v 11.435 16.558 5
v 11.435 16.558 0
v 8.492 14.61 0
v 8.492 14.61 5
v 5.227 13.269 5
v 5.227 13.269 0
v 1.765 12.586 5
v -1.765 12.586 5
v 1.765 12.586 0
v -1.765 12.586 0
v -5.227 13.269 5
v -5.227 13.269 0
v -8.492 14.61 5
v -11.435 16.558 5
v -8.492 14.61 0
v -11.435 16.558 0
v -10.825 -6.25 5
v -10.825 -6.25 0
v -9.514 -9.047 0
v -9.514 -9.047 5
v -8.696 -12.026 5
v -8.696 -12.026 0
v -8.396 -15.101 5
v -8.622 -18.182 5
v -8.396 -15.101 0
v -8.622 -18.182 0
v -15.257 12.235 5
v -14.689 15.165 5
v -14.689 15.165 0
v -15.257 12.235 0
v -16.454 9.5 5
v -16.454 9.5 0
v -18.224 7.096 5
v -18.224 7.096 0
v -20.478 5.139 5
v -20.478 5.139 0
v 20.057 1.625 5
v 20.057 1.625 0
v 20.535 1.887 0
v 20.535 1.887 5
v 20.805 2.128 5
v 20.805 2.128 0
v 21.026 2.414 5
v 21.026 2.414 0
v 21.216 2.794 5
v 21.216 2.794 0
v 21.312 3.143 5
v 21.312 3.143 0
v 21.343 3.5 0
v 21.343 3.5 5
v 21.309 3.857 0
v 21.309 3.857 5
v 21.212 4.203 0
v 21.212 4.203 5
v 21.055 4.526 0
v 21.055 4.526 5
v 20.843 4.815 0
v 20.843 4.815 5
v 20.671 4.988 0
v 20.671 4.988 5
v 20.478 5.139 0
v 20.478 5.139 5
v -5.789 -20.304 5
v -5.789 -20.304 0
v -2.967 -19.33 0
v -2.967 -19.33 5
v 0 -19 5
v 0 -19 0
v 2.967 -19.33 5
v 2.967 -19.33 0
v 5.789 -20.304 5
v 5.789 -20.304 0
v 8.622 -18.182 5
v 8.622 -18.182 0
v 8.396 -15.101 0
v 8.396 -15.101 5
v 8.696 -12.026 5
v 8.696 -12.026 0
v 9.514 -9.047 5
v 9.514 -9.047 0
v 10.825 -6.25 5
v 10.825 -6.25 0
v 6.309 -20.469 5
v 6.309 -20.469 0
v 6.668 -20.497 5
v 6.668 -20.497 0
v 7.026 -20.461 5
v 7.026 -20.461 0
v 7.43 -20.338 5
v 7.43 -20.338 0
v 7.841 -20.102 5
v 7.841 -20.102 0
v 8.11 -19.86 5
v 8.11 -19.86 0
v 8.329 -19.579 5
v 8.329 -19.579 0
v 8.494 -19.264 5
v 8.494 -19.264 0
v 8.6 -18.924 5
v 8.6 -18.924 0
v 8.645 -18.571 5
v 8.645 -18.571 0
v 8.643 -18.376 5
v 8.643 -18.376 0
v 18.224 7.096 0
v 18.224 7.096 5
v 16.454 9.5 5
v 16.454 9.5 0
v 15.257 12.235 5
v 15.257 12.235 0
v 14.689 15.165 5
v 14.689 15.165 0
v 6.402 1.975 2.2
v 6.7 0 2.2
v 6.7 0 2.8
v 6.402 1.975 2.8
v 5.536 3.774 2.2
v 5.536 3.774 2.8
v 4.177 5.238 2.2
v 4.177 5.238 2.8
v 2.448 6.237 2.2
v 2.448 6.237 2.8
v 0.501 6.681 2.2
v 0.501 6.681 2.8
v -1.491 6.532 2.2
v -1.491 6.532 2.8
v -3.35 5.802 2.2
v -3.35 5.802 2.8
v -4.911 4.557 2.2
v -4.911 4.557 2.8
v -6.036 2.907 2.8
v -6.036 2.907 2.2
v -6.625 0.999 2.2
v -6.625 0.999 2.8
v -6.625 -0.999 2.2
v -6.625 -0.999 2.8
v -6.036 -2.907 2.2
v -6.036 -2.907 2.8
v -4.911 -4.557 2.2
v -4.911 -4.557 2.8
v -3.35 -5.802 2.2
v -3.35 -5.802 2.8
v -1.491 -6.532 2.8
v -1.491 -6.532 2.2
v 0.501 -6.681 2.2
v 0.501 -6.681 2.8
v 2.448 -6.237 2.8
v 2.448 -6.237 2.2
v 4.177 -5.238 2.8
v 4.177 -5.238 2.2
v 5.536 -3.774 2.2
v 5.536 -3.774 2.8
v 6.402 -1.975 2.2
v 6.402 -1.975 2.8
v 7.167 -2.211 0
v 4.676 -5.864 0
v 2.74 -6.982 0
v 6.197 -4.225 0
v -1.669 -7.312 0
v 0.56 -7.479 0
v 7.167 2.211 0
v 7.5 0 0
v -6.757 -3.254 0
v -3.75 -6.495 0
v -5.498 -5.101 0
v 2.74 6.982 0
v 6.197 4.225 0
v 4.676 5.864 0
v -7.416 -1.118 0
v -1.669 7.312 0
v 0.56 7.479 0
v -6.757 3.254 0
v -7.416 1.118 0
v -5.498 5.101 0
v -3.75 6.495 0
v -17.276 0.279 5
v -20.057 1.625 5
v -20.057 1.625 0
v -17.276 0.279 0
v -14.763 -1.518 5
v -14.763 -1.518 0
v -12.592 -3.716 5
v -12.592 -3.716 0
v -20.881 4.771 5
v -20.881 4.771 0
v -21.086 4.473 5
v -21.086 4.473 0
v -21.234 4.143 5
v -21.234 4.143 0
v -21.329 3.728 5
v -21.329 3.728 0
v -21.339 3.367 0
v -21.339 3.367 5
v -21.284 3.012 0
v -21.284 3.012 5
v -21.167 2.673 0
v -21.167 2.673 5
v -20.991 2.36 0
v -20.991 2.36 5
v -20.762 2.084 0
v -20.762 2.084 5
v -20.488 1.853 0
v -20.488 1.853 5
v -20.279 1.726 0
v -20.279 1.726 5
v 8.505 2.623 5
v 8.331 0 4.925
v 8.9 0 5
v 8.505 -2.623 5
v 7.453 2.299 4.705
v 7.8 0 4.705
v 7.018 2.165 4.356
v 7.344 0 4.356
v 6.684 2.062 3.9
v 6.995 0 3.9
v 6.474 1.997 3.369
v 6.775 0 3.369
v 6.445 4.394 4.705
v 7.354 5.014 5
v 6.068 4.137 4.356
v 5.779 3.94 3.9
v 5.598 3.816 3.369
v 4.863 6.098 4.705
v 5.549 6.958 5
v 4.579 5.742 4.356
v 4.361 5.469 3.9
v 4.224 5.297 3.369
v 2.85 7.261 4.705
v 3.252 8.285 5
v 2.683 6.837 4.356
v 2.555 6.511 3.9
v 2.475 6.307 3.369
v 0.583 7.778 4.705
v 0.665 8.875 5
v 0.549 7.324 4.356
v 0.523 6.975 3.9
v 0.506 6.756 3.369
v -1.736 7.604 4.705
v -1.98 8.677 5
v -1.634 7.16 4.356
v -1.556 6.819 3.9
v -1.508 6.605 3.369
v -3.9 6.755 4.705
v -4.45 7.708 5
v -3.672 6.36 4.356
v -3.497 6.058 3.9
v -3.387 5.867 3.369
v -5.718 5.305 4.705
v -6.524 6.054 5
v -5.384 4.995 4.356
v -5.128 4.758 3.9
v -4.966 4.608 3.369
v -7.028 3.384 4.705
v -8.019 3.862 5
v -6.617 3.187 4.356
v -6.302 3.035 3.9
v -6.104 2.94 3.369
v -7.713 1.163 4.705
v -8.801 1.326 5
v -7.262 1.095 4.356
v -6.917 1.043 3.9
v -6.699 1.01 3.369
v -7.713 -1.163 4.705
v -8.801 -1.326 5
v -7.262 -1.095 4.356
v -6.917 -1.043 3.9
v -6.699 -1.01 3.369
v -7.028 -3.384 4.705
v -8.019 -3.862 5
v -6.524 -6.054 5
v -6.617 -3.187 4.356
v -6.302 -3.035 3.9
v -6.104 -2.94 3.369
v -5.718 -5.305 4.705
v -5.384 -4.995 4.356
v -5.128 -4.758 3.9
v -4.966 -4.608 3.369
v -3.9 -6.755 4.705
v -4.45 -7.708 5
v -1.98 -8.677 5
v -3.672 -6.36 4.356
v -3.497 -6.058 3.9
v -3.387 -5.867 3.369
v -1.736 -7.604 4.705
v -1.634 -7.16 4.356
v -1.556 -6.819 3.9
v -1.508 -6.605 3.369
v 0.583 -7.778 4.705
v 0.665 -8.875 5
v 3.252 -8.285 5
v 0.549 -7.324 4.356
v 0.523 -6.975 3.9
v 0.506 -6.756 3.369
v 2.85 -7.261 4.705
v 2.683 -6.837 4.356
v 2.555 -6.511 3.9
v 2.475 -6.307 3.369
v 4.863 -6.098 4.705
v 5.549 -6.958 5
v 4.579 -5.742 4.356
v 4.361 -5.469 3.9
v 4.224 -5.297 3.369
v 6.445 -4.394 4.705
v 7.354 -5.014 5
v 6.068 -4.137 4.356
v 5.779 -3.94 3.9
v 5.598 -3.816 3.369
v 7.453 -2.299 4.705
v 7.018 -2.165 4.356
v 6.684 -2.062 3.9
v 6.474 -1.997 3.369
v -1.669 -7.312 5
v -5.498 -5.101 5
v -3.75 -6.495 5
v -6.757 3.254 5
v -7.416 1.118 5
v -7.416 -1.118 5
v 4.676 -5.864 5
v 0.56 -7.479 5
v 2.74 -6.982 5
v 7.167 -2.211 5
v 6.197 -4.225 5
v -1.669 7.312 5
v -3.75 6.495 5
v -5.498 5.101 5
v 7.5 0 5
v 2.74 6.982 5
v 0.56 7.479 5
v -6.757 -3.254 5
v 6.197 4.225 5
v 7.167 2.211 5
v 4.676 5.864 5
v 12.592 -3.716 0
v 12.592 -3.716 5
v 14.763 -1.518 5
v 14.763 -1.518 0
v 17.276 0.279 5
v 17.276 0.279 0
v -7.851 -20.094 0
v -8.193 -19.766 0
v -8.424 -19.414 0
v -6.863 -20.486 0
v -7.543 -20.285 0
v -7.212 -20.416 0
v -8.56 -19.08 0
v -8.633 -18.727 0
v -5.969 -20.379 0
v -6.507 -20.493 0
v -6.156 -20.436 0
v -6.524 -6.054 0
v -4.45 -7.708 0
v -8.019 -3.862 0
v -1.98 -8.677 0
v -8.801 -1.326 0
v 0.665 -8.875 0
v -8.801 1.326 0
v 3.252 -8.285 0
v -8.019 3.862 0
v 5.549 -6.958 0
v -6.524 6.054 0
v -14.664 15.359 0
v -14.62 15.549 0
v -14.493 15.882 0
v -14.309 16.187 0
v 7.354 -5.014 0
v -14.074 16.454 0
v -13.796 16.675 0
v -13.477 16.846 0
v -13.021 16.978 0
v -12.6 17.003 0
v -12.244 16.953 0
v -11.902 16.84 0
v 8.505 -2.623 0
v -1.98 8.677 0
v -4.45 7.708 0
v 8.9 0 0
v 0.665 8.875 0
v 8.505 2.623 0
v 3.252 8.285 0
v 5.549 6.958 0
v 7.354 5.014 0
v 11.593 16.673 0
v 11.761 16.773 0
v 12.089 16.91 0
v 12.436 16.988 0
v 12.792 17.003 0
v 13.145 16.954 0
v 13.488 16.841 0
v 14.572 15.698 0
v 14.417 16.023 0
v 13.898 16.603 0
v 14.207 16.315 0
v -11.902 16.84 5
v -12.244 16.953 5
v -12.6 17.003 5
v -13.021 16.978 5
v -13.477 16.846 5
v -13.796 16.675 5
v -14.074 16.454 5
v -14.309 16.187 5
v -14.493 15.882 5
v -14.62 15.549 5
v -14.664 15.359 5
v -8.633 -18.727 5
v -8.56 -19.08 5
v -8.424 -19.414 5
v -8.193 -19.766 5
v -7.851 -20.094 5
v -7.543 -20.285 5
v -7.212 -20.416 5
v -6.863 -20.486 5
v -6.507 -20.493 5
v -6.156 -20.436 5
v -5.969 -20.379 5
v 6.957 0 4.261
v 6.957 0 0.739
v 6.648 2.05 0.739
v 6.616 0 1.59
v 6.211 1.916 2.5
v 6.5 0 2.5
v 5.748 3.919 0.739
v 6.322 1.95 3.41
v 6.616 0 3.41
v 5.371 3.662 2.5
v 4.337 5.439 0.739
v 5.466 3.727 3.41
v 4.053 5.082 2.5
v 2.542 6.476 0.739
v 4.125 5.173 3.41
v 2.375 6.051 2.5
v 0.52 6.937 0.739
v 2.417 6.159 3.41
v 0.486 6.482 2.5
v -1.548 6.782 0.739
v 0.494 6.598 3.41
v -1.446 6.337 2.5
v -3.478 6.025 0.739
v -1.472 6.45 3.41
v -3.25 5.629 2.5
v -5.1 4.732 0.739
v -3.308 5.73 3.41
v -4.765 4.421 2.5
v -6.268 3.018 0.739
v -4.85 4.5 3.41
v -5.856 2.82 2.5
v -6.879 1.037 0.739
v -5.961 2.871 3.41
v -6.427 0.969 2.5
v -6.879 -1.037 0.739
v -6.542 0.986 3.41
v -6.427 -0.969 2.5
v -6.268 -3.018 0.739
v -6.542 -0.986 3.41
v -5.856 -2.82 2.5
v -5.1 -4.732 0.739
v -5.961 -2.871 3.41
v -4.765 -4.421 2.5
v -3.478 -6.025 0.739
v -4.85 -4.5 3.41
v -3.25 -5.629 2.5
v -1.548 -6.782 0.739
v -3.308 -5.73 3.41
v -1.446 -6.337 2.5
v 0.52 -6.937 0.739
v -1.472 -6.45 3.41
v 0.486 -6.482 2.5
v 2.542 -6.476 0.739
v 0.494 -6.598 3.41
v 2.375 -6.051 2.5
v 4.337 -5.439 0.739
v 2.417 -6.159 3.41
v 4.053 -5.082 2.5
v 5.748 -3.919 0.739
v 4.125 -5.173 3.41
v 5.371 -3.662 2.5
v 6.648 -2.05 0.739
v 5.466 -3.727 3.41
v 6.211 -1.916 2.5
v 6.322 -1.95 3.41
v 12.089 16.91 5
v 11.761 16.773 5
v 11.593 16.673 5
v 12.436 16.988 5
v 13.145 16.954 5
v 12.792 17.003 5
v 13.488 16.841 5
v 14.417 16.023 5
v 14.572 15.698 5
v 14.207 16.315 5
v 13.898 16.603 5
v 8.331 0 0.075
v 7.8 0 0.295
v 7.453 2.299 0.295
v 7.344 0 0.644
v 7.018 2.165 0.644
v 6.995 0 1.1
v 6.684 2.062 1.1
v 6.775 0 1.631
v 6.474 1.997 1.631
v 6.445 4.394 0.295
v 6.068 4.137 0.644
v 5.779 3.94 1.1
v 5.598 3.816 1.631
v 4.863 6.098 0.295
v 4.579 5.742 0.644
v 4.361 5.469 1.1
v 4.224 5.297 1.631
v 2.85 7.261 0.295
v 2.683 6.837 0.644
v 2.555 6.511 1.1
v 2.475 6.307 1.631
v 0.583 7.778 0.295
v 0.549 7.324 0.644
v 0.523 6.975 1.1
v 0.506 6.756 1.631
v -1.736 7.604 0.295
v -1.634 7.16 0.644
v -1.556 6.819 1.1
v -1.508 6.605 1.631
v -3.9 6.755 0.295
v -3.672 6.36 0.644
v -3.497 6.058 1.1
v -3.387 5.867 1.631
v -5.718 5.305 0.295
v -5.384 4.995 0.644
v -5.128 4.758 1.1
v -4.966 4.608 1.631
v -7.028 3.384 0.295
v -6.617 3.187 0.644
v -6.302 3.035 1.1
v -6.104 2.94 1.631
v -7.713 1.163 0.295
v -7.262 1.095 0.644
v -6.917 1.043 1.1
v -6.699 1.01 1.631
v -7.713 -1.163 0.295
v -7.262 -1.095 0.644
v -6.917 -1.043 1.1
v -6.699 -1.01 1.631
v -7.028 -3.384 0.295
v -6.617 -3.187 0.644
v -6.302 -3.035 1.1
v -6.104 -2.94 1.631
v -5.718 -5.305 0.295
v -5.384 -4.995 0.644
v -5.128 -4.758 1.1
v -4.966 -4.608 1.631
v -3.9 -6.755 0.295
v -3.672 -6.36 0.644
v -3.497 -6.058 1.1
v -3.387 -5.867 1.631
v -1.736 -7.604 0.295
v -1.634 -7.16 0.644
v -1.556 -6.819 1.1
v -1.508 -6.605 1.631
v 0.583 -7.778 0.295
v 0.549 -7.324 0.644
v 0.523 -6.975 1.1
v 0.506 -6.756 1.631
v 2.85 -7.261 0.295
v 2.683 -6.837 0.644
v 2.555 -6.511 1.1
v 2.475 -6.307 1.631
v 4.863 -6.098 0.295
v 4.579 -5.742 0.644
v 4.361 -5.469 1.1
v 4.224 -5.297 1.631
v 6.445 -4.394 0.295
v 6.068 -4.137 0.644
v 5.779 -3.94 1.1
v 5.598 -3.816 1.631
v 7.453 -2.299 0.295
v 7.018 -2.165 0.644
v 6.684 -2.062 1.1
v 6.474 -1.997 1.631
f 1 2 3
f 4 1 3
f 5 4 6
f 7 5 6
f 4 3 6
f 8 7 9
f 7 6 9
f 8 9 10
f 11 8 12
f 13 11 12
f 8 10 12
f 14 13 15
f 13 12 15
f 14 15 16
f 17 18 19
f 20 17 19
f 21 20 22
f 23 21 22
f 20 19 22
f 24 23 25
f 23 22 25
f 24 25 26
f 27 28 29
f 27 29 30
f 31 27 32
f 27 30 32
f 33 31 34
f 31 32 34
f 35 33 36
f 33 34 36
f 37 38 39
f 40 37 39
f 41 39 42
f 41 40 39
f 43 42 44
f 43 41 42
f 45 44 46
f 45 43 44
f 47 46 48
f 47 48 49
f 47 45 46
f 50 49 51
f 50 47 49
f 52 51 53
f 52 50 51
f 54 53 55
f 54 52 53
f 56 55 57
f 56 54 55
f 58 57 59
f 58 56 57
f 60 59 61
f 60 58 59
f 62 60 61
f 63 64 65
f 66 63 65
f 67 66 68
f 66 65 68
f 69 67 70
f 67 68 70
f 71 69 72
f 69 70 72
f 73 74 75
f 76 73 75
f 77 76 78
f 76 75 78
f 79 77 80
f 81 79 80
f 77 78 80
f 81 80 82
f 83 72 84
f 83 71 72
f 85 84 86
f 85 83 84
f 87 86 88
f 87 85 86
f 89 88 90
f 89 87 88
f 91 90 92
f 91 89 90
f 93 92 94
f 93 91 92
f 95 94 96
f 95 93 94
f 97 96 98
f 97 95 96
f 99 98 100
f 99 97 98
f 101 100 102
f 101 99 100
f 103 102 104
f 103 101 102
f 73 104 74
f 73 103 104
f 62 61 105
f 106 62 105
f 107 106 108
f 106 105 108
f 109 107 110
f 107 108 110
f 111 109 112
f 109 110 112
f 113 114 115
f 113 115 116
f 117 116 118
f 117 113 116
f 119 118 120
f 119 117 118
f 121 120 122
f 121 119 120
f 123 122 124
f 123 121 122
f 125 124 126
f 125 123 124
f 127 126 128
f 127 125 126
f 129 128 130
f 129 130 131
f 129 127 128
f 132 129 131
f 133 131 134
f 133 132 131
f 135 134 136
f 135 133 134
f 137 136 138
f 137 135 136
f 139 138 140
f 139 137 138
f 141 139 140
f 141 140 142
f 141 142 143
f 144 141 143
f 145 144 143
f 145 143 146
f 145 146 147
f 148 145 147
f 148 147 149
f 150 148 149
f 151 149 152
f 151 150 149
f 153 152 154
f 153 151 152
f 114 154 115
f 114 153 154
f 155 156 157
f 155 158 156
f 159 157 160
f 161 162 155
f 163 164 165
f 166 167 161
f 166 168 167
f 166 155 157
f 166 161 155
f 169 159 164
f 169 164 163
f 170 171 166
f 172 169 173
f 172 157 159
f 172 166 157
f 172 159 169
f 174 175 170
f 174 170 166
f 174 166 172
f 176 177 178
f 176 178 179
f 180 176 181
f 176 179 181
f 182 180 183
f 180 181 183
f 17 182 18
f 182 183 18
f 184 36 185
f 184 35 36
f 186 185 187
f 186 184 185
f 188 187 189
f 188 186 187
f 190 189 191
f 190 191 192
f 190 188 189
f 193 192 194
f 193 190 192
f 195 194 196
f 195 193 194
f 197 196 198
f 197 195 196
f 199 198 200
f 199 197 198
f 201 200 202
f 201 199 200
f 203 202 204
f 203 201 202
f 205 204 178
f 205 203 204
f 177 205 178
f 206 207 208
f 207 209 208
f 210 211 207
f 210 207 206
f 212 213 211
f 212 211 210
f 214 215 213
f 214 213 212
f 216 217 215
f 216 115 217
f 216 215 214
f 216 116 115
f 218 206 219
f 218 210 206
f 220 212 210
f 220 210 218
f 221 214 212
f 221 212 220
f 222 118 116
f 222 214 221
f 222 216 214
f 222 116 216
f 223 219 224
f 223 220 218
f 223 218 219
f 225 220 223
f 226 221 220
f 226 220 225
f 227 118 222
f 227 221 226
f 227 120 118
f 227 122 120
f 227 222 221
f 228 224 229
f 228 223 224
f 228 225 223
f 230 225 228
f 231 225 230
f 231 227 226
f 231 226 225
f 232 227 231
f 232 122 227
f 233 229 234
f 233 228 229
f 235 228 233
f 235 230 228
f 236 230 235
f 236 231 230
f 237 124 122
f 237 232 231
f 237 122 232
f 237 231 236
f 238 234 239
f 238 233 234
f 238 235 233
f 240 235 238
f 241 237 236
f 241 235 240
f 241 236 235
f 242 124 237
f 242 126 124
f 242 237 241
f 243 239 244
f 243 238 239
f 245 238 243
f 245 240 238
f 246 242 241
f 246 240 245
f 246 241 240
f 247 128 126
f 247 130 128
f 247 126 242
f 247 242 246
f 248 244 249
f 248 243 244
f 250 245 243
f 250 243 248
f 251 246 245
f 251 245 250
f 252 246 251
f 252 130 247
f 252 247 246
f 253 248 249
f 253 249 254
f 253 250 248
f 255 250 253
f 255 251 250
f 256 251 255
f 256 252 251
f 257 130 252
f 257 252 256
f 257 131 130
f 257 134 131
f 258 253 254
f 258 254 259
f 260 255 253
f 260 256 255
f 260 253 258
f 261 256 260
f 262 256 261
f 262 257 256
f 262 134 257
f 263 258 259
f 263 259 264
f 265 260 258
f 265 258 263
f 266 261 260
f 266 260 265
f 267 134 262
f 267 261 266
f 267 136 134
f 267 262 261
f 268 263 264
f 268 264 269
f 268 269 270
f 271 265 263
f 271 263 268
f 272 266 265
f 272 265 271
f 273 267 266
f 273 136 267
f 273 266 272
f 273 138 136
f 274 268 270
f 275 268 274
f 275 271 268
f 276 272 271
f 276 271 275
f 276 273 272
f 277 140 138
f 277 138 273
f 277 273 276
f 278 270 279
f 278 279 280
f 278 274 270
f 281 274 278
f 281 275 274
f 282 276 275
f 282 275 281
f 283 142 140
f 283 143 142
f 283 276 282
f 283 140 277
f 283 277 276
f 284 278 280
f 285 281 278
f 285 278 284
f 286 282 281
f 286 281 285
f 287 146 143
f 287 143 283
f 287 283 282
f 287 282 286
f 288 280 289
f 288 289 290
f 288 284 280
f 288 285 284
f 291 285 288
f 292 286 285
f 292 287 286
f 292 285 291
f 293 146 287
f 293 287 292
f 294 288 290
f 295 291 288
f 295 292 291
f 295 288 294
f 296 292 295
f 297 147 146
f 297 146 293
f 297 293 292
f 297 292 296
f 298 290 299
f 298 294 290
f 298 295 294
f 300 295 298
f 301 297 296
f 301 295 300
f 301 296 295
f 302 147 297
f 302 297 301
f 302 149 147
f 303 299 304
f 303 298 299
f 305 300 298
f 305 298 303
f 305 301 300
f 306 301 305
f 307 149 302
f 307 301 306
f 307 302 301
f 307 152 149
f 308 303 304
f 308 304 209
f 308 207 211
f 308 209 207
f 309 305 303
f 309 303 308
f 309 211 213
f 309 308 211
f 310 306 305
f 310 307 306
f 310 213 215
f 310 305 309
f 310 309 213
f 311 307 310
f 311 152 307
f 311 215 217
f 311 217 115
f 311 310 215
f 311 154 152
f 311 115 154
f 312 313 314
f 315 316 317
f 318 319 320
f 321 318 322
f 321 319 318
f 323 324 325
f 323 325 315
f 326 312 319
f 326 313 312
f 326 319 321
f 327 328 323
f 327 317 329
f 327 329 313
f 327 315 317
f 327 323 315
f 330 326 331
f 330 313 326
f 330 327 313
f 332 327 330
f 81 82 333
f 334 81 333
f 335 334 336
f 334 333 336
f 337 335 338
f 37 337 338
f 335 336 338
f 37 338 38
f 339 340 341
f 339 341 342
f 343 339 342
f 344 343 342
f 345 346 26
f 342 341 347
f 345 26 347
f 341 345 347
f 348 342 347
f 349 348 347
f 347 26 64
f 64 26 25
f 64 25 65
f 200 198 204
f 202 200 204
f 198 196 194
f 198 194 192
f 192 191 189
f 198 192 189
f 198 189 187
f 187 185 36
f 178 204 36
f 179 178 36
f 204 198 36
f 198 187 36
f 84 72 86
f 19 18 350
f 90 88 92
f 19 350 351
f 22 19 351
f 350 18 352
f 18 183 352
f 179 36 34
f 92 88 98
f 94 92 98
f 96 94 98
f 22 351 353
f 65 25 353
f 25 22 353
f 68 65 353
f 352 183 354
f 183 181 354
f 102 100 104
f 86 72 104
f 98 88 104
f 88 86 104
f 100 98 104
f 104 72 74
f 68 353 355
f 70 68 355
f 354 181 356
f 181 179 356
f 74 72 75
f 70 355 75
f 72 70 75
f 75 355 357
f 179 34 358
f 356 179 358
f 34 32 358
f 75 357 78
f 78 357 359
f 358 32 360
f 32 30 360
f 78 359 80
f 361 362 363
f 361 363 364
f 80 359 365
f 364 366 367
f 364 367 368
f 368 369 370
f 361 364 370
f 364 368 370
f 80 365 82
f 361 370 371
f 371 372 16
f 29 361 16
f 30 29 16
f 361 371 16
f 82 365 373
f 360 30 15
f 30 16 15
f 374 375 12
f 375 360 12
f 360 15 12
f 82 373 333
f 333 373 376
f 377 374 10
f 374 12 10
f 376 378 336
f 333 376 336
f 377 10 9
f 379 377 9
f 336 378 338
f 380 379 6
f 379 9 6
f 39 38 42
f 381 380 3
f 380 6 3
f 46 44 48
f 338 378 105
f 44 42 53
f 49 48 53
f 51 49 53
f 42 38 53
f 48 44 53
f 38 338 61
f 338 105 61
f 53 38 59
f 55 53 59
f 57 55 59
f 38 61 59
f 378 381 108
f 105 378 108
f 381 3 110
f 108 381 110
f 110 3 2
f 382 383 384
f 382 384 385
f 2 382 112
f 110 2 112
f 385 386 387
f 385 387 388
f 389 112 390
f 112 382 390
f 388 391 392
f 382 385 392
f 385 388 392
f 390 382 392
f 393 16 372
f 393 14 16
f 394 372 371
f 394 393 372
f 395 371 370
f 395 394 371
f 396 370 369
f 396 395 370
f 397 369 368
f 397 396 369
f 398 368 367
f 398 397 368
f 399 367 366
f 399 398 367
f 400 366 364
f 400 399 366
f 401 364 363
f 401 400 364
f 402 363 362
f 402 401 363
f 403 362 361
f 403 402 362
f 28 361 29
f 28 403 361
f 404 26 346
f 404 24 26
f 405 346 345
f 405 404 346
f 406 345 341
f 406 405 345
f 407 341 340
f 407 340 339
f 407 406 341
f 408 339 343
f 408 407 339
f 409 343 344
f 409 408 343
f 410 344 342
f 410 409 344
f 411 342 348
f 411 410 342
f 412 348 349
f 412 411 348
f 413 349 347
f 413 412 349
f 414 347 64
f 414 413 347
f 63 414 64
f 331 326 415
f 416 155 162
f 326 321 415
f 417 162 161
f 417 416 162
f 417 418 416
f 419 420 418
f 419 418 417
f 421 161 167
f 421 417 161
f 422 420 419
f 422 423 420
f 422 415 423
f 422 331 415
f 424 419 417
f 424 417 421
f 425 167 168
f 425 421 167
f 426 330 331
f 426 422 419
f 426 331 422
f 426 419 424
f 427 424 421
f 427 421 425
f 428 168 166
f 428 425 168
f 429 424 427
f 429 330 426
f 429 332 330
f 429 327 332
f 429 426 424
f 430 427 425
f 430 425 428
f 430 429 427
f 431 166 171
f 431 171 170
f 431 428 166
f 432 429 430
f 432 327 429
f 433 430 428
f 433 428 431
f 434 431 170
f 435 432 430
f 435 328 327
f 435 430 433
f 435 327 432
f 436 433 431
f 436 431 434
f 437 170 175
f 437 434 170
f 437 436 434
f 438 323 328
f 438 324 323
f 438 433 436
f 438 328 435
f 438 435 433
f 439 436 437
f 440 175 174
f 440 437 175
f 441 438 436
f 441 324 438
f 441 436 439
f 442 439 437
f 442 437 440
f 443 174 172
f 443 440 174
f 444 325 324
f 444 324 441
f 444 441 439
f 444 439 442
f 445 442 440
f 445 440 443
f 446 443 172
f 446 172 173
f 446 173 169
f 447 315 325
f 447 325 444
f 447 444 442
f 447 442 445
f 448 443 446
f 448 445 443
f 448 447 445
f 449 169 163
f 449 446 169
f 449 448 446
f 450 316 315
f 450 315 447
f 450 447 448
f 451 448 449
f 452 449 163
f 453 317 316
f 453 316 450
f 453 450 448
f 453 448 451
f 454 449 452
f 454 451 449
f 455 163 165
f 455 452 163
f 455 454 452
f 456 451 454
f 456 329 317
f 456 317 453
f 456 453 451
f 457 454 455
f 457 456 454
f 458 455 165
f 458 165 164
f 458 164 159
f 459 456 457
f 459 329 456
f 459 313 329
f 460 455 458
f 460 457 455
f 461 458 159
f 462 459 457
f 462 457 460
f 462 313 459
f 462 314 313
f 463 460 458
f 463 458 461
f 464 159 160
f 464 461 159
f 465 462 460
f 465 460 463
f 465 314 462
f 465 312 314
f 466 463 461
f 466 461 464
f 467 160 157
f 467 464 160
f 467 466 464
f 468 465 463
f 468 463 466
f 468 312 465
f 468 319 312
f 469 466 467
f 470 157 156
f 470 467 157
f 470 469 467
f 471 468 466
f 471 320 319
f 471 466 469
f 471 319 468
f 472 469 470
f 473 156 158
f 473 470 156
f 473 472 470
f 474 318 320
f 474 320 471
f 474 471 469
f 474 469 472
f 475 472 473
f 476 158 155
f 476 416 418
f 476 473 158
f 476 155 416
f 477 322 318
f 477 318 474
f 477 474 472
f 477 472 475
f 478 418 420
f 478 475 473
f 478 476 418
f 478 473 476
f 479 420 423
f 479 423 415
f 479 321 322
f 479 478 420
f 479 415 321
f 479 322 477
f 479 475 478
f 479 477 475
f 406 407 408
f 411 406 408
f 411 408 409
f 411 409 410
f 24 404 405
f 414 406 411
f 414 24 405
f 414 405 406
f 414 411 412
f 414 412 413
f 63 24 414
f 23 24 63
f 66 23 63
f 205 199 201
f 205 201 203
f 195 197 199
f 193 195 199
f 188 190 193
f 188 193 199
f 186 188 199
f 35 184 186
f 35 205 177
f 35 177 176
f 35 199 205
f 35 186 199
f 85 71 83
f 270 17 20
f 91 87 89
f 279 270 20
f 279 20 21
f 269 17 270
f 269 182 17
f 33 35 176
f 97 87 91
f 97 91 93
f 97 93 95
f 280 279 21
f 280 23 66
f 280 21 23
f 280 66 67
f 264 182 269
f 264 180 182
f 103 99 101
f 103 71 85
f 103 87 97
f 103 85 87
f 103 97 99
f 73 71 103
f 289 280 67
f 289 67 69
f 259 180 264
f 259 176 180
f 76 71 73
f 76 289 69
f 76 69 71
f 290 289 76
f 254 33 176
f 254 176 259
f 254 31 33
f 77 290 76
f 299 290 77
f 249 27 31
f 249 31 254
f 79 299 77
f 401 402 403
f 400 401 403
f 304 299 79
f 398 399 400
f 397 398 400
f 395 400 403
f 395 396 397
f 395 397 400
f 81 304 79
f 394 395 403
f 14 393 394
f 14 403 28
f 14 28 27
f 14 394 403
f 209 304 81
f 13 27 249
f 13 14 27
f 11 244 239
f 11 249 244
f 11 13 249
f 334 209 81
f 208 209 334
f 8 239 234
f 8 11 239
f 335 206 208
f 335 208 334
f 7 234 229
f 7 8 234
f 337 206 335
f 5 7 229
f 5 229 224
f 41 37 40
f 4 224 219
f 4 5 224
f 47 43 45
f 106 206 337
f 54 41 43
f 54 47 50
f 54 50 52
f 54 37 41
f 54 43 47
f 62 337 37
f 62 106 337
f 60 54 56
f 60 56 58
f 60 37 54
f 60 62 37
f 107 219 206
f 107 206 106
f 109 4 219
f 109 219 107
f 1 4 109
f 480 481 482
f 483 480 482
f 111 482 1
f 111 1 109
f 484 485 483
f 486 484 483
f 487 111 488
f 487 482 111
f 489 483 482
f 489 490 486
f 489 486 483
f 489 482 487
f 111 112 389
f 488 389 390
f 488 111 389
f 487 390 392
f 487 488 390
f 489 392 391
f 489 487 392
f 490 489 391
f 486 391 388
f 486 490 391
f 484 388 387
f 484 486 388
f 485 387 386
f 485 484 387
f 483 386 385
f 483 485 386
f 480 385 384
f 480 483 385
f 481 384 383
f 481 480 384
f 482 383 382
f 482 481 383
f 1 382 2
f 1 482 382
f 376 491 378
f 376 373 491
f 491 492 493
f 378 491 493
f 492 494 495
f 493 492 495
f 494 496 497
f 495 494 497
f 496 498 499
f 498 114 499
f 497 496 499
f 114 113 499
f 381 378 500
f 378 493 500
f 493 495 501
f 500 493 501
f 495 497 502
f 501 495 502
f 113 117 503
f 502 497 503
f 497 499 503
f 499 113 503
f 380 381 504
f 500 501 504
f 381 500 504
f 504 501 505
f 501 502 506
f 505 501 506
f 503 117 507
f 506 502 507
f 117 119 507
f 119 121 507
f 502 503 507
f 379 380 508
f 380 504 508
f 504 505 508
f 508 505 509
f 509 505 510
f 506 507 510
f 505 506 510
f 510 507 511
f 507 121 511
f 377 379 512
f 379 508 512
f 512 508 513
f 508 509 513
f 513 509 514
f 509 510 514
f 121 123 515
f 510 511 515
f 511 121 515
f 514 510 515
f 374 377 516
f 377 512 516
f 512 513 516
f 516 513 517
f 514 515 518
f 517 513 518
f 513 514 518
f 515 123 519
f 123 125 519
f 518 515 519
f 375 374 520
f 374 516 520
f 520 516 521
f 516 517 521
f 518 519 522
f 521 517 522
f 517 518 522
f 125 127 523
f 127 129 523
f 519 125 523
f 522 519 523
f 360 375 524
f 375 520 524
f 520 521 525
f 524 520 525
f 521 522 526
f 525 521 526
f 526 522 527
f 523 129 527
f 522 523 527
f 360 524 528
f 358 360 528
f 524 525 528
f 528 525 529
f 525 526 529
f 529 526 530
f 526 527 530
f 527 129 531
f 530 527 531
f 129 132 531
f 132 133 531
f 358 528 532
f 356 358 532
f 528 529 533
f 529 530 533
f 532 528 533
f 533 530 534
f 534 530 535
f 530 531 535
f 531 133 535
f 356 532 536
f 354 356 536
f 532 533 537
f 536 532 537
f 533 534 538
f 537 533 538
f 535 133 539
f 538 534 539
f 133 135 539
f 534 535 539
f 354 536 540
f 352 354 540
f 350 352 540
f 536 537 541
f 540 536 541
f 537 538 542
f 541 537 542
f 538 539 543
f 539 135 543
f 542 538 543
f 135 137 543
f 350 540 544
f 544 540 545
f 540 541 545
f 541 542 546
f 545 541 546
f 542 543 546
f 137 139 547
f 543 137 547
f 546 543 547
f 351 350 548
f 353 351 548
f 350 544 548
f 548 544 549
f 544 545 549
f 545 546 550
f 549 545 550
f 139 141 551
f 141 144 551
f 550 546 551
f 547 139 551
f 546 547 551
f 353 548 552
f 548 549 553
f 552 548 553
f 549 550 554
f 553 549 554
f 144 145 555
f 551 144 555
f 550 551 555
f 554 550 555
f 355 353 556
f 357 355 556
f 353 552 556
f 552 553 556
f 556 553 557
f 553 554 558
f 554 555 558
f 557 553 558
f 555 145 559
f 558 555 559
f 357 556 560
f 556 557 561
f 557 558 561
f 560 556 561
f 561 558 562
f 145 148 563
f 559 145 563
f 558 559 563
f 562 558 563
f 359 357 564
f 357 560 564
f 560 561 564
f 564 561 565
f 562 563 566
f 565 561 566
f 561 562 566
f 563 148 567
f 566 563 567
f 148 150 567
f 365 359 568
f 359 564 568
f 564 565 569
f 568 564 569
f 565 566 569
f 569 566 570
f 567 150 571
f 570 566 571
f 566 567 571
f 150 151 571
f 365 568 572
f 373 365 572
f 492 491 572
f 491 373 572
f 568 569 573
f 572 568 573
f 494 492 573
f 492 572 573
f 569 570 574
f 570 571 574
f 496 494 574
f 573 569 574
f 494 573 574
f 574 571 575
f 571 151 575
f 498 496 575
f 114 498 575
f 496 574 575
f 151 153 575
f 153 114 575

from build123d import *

# Parameters (mm, degrees)
F0_R     = 7.5
F0_R_2   = 6.7
F1_DEPTH = 5
F2_R     = 2
F3_R     = 2.2


# Not quite as in the source:
# - a feature names something its author has since deleted; it is built from what else it names


with BuildPart() as f1:
    # F0 (on Top) → F1 (new body)
    with BuildSketch(Plane.XY):
        with BuildLine():
            ThreePointArc((12.5, 0), (8.8388347698, 8.8388347598), (1.42e-08, 12.5))
            ThreePointArc((1.42e-08, 12.5), (-10.8253174308, 6.2500002019), (-10.8253177733, -6.2499996085))
            ThreePointArc((-10.8253177733, -6.2499996085), (-4.25e-08, -12.5), (10.8253177308, -6.2499996822))
            ThreePointArc((10.8253177308, -6.2499996822), (12.0740728761, -3.2352378865), (12.5, 0))
        make_face()
        Circle(F0_R, mode=Mode.SUBTRACT)
        Circle(F0_R)
        Circle(F0_R_2, mode=Mode.SUBTRACT)
        with BuildLine():
            ThreePointArc((26.773933784, 2.8198878343), (16.4544826719, 9.5), (15.8290613924, 21.776962899))
            ThreePointArc((15.8290613924, 21.776962899), (9.1736201366, 14.9901270648), (1.42e-08, 12.5))
            ThreePointArc((1.42e-08, 12.5), (8.8388347698, 8.8388347598), (12.5, 0))
            ThreePointArc((12.5, 0), (12.0740728761, -3.2352378865), (10.8253177308, -6.2499996822))
            ThreePointArc((10.8253177308, -6.2499996822), (17.5686410658, 0.4495246378), (26.773933784, 2.8198878343))
        make_face()
        with BuildLine():
            ThreePointArc((-10.8253177733, -6.2499996085), (-10.8253174308, 6.2500002019), (1.42e-08, 12.5))
            ThreePointArc((1.42e-08, 12.5), (-9.1736201244, 14.9901270577), (-15.8290613924, 21.7769628991))
            ThreePointArc((-15.8290613924, 21.7769628991), (-14.9449484341, 19.0761000413), (-14.645825623, 16.25))
            ThreePointArc((-14.645825623, 16.25), (-18.1265806458, 7.2020869762), (-26.773933784, 2.8198878343))
            ThreePointArc((-26.773933784, 2.8198878343), (-17.5686411027, 0.4495246588), (-10.8253177733, -6.2499996085))
        make_face()
        with BuildLine():
            ThreePointArc((10.9448723917, -24.5968507334), (8.3950207746, -15.4396514248), (10.8253177308, -6.2499996822))
            ThreePointArc((10.8253177308, -6.2499996822), (-4.25e-08, -12.5), (-10.8253177733, -6.2499996085))
            ThreePointArc((-10.8253177733, -6.2499996085), (-8.3950207743, -15.4396513823), (-10.9448723917, -24.5968507334))
            ThreePointArc((-10.9448723917, -24.5968507334), (0, -19), (10.9448723917, -24.5968507334))
        make_face()
    extrude(amount=F1_DEPTH)

    # F2
    f2_edges = [f1.edges().sort_by_distance(p)[0] for p in [
        (10.944872, -24.596851, 2.5),
        (-10.944872, -24.596851, 2.5),
        (26.773934, 2.819888, 2.5),
        (15.829061, 21.776963, 2.5),
        (-26.773934, 2.819888, 2.5),
        (-15.829061, 21.776963, 2.5),
    ]]
    fillet(f2_edges, radius=F2_R)

    # F3
    f3_edges = [f1.edges().sort_by_distance(p)[0] for p in [
        (-6.7, 0, 5),
        (-6.7, 0, 0),
    ]]
    fillet(f3_edges, radius=F3_R)


with BuildPart() as f5:
    # F4 (on Front) → F5 (revolve)
    with BuildSketch(Plane.XZ):
        with BuildLine():
            Line((7.5, 5), (0, 5))
            Line((0, 5), (0, 0))
            Line((0, 0), (7.5, 0))
            ThreePointArc((7.5, 0), (6.5, 2.5), (7.5, 5))
        make_face()
    revolve(axis=Axis((0, 0, 5.3585310292), (0, 0, 1)))


solid = Compound([f1.part, f5.part])
